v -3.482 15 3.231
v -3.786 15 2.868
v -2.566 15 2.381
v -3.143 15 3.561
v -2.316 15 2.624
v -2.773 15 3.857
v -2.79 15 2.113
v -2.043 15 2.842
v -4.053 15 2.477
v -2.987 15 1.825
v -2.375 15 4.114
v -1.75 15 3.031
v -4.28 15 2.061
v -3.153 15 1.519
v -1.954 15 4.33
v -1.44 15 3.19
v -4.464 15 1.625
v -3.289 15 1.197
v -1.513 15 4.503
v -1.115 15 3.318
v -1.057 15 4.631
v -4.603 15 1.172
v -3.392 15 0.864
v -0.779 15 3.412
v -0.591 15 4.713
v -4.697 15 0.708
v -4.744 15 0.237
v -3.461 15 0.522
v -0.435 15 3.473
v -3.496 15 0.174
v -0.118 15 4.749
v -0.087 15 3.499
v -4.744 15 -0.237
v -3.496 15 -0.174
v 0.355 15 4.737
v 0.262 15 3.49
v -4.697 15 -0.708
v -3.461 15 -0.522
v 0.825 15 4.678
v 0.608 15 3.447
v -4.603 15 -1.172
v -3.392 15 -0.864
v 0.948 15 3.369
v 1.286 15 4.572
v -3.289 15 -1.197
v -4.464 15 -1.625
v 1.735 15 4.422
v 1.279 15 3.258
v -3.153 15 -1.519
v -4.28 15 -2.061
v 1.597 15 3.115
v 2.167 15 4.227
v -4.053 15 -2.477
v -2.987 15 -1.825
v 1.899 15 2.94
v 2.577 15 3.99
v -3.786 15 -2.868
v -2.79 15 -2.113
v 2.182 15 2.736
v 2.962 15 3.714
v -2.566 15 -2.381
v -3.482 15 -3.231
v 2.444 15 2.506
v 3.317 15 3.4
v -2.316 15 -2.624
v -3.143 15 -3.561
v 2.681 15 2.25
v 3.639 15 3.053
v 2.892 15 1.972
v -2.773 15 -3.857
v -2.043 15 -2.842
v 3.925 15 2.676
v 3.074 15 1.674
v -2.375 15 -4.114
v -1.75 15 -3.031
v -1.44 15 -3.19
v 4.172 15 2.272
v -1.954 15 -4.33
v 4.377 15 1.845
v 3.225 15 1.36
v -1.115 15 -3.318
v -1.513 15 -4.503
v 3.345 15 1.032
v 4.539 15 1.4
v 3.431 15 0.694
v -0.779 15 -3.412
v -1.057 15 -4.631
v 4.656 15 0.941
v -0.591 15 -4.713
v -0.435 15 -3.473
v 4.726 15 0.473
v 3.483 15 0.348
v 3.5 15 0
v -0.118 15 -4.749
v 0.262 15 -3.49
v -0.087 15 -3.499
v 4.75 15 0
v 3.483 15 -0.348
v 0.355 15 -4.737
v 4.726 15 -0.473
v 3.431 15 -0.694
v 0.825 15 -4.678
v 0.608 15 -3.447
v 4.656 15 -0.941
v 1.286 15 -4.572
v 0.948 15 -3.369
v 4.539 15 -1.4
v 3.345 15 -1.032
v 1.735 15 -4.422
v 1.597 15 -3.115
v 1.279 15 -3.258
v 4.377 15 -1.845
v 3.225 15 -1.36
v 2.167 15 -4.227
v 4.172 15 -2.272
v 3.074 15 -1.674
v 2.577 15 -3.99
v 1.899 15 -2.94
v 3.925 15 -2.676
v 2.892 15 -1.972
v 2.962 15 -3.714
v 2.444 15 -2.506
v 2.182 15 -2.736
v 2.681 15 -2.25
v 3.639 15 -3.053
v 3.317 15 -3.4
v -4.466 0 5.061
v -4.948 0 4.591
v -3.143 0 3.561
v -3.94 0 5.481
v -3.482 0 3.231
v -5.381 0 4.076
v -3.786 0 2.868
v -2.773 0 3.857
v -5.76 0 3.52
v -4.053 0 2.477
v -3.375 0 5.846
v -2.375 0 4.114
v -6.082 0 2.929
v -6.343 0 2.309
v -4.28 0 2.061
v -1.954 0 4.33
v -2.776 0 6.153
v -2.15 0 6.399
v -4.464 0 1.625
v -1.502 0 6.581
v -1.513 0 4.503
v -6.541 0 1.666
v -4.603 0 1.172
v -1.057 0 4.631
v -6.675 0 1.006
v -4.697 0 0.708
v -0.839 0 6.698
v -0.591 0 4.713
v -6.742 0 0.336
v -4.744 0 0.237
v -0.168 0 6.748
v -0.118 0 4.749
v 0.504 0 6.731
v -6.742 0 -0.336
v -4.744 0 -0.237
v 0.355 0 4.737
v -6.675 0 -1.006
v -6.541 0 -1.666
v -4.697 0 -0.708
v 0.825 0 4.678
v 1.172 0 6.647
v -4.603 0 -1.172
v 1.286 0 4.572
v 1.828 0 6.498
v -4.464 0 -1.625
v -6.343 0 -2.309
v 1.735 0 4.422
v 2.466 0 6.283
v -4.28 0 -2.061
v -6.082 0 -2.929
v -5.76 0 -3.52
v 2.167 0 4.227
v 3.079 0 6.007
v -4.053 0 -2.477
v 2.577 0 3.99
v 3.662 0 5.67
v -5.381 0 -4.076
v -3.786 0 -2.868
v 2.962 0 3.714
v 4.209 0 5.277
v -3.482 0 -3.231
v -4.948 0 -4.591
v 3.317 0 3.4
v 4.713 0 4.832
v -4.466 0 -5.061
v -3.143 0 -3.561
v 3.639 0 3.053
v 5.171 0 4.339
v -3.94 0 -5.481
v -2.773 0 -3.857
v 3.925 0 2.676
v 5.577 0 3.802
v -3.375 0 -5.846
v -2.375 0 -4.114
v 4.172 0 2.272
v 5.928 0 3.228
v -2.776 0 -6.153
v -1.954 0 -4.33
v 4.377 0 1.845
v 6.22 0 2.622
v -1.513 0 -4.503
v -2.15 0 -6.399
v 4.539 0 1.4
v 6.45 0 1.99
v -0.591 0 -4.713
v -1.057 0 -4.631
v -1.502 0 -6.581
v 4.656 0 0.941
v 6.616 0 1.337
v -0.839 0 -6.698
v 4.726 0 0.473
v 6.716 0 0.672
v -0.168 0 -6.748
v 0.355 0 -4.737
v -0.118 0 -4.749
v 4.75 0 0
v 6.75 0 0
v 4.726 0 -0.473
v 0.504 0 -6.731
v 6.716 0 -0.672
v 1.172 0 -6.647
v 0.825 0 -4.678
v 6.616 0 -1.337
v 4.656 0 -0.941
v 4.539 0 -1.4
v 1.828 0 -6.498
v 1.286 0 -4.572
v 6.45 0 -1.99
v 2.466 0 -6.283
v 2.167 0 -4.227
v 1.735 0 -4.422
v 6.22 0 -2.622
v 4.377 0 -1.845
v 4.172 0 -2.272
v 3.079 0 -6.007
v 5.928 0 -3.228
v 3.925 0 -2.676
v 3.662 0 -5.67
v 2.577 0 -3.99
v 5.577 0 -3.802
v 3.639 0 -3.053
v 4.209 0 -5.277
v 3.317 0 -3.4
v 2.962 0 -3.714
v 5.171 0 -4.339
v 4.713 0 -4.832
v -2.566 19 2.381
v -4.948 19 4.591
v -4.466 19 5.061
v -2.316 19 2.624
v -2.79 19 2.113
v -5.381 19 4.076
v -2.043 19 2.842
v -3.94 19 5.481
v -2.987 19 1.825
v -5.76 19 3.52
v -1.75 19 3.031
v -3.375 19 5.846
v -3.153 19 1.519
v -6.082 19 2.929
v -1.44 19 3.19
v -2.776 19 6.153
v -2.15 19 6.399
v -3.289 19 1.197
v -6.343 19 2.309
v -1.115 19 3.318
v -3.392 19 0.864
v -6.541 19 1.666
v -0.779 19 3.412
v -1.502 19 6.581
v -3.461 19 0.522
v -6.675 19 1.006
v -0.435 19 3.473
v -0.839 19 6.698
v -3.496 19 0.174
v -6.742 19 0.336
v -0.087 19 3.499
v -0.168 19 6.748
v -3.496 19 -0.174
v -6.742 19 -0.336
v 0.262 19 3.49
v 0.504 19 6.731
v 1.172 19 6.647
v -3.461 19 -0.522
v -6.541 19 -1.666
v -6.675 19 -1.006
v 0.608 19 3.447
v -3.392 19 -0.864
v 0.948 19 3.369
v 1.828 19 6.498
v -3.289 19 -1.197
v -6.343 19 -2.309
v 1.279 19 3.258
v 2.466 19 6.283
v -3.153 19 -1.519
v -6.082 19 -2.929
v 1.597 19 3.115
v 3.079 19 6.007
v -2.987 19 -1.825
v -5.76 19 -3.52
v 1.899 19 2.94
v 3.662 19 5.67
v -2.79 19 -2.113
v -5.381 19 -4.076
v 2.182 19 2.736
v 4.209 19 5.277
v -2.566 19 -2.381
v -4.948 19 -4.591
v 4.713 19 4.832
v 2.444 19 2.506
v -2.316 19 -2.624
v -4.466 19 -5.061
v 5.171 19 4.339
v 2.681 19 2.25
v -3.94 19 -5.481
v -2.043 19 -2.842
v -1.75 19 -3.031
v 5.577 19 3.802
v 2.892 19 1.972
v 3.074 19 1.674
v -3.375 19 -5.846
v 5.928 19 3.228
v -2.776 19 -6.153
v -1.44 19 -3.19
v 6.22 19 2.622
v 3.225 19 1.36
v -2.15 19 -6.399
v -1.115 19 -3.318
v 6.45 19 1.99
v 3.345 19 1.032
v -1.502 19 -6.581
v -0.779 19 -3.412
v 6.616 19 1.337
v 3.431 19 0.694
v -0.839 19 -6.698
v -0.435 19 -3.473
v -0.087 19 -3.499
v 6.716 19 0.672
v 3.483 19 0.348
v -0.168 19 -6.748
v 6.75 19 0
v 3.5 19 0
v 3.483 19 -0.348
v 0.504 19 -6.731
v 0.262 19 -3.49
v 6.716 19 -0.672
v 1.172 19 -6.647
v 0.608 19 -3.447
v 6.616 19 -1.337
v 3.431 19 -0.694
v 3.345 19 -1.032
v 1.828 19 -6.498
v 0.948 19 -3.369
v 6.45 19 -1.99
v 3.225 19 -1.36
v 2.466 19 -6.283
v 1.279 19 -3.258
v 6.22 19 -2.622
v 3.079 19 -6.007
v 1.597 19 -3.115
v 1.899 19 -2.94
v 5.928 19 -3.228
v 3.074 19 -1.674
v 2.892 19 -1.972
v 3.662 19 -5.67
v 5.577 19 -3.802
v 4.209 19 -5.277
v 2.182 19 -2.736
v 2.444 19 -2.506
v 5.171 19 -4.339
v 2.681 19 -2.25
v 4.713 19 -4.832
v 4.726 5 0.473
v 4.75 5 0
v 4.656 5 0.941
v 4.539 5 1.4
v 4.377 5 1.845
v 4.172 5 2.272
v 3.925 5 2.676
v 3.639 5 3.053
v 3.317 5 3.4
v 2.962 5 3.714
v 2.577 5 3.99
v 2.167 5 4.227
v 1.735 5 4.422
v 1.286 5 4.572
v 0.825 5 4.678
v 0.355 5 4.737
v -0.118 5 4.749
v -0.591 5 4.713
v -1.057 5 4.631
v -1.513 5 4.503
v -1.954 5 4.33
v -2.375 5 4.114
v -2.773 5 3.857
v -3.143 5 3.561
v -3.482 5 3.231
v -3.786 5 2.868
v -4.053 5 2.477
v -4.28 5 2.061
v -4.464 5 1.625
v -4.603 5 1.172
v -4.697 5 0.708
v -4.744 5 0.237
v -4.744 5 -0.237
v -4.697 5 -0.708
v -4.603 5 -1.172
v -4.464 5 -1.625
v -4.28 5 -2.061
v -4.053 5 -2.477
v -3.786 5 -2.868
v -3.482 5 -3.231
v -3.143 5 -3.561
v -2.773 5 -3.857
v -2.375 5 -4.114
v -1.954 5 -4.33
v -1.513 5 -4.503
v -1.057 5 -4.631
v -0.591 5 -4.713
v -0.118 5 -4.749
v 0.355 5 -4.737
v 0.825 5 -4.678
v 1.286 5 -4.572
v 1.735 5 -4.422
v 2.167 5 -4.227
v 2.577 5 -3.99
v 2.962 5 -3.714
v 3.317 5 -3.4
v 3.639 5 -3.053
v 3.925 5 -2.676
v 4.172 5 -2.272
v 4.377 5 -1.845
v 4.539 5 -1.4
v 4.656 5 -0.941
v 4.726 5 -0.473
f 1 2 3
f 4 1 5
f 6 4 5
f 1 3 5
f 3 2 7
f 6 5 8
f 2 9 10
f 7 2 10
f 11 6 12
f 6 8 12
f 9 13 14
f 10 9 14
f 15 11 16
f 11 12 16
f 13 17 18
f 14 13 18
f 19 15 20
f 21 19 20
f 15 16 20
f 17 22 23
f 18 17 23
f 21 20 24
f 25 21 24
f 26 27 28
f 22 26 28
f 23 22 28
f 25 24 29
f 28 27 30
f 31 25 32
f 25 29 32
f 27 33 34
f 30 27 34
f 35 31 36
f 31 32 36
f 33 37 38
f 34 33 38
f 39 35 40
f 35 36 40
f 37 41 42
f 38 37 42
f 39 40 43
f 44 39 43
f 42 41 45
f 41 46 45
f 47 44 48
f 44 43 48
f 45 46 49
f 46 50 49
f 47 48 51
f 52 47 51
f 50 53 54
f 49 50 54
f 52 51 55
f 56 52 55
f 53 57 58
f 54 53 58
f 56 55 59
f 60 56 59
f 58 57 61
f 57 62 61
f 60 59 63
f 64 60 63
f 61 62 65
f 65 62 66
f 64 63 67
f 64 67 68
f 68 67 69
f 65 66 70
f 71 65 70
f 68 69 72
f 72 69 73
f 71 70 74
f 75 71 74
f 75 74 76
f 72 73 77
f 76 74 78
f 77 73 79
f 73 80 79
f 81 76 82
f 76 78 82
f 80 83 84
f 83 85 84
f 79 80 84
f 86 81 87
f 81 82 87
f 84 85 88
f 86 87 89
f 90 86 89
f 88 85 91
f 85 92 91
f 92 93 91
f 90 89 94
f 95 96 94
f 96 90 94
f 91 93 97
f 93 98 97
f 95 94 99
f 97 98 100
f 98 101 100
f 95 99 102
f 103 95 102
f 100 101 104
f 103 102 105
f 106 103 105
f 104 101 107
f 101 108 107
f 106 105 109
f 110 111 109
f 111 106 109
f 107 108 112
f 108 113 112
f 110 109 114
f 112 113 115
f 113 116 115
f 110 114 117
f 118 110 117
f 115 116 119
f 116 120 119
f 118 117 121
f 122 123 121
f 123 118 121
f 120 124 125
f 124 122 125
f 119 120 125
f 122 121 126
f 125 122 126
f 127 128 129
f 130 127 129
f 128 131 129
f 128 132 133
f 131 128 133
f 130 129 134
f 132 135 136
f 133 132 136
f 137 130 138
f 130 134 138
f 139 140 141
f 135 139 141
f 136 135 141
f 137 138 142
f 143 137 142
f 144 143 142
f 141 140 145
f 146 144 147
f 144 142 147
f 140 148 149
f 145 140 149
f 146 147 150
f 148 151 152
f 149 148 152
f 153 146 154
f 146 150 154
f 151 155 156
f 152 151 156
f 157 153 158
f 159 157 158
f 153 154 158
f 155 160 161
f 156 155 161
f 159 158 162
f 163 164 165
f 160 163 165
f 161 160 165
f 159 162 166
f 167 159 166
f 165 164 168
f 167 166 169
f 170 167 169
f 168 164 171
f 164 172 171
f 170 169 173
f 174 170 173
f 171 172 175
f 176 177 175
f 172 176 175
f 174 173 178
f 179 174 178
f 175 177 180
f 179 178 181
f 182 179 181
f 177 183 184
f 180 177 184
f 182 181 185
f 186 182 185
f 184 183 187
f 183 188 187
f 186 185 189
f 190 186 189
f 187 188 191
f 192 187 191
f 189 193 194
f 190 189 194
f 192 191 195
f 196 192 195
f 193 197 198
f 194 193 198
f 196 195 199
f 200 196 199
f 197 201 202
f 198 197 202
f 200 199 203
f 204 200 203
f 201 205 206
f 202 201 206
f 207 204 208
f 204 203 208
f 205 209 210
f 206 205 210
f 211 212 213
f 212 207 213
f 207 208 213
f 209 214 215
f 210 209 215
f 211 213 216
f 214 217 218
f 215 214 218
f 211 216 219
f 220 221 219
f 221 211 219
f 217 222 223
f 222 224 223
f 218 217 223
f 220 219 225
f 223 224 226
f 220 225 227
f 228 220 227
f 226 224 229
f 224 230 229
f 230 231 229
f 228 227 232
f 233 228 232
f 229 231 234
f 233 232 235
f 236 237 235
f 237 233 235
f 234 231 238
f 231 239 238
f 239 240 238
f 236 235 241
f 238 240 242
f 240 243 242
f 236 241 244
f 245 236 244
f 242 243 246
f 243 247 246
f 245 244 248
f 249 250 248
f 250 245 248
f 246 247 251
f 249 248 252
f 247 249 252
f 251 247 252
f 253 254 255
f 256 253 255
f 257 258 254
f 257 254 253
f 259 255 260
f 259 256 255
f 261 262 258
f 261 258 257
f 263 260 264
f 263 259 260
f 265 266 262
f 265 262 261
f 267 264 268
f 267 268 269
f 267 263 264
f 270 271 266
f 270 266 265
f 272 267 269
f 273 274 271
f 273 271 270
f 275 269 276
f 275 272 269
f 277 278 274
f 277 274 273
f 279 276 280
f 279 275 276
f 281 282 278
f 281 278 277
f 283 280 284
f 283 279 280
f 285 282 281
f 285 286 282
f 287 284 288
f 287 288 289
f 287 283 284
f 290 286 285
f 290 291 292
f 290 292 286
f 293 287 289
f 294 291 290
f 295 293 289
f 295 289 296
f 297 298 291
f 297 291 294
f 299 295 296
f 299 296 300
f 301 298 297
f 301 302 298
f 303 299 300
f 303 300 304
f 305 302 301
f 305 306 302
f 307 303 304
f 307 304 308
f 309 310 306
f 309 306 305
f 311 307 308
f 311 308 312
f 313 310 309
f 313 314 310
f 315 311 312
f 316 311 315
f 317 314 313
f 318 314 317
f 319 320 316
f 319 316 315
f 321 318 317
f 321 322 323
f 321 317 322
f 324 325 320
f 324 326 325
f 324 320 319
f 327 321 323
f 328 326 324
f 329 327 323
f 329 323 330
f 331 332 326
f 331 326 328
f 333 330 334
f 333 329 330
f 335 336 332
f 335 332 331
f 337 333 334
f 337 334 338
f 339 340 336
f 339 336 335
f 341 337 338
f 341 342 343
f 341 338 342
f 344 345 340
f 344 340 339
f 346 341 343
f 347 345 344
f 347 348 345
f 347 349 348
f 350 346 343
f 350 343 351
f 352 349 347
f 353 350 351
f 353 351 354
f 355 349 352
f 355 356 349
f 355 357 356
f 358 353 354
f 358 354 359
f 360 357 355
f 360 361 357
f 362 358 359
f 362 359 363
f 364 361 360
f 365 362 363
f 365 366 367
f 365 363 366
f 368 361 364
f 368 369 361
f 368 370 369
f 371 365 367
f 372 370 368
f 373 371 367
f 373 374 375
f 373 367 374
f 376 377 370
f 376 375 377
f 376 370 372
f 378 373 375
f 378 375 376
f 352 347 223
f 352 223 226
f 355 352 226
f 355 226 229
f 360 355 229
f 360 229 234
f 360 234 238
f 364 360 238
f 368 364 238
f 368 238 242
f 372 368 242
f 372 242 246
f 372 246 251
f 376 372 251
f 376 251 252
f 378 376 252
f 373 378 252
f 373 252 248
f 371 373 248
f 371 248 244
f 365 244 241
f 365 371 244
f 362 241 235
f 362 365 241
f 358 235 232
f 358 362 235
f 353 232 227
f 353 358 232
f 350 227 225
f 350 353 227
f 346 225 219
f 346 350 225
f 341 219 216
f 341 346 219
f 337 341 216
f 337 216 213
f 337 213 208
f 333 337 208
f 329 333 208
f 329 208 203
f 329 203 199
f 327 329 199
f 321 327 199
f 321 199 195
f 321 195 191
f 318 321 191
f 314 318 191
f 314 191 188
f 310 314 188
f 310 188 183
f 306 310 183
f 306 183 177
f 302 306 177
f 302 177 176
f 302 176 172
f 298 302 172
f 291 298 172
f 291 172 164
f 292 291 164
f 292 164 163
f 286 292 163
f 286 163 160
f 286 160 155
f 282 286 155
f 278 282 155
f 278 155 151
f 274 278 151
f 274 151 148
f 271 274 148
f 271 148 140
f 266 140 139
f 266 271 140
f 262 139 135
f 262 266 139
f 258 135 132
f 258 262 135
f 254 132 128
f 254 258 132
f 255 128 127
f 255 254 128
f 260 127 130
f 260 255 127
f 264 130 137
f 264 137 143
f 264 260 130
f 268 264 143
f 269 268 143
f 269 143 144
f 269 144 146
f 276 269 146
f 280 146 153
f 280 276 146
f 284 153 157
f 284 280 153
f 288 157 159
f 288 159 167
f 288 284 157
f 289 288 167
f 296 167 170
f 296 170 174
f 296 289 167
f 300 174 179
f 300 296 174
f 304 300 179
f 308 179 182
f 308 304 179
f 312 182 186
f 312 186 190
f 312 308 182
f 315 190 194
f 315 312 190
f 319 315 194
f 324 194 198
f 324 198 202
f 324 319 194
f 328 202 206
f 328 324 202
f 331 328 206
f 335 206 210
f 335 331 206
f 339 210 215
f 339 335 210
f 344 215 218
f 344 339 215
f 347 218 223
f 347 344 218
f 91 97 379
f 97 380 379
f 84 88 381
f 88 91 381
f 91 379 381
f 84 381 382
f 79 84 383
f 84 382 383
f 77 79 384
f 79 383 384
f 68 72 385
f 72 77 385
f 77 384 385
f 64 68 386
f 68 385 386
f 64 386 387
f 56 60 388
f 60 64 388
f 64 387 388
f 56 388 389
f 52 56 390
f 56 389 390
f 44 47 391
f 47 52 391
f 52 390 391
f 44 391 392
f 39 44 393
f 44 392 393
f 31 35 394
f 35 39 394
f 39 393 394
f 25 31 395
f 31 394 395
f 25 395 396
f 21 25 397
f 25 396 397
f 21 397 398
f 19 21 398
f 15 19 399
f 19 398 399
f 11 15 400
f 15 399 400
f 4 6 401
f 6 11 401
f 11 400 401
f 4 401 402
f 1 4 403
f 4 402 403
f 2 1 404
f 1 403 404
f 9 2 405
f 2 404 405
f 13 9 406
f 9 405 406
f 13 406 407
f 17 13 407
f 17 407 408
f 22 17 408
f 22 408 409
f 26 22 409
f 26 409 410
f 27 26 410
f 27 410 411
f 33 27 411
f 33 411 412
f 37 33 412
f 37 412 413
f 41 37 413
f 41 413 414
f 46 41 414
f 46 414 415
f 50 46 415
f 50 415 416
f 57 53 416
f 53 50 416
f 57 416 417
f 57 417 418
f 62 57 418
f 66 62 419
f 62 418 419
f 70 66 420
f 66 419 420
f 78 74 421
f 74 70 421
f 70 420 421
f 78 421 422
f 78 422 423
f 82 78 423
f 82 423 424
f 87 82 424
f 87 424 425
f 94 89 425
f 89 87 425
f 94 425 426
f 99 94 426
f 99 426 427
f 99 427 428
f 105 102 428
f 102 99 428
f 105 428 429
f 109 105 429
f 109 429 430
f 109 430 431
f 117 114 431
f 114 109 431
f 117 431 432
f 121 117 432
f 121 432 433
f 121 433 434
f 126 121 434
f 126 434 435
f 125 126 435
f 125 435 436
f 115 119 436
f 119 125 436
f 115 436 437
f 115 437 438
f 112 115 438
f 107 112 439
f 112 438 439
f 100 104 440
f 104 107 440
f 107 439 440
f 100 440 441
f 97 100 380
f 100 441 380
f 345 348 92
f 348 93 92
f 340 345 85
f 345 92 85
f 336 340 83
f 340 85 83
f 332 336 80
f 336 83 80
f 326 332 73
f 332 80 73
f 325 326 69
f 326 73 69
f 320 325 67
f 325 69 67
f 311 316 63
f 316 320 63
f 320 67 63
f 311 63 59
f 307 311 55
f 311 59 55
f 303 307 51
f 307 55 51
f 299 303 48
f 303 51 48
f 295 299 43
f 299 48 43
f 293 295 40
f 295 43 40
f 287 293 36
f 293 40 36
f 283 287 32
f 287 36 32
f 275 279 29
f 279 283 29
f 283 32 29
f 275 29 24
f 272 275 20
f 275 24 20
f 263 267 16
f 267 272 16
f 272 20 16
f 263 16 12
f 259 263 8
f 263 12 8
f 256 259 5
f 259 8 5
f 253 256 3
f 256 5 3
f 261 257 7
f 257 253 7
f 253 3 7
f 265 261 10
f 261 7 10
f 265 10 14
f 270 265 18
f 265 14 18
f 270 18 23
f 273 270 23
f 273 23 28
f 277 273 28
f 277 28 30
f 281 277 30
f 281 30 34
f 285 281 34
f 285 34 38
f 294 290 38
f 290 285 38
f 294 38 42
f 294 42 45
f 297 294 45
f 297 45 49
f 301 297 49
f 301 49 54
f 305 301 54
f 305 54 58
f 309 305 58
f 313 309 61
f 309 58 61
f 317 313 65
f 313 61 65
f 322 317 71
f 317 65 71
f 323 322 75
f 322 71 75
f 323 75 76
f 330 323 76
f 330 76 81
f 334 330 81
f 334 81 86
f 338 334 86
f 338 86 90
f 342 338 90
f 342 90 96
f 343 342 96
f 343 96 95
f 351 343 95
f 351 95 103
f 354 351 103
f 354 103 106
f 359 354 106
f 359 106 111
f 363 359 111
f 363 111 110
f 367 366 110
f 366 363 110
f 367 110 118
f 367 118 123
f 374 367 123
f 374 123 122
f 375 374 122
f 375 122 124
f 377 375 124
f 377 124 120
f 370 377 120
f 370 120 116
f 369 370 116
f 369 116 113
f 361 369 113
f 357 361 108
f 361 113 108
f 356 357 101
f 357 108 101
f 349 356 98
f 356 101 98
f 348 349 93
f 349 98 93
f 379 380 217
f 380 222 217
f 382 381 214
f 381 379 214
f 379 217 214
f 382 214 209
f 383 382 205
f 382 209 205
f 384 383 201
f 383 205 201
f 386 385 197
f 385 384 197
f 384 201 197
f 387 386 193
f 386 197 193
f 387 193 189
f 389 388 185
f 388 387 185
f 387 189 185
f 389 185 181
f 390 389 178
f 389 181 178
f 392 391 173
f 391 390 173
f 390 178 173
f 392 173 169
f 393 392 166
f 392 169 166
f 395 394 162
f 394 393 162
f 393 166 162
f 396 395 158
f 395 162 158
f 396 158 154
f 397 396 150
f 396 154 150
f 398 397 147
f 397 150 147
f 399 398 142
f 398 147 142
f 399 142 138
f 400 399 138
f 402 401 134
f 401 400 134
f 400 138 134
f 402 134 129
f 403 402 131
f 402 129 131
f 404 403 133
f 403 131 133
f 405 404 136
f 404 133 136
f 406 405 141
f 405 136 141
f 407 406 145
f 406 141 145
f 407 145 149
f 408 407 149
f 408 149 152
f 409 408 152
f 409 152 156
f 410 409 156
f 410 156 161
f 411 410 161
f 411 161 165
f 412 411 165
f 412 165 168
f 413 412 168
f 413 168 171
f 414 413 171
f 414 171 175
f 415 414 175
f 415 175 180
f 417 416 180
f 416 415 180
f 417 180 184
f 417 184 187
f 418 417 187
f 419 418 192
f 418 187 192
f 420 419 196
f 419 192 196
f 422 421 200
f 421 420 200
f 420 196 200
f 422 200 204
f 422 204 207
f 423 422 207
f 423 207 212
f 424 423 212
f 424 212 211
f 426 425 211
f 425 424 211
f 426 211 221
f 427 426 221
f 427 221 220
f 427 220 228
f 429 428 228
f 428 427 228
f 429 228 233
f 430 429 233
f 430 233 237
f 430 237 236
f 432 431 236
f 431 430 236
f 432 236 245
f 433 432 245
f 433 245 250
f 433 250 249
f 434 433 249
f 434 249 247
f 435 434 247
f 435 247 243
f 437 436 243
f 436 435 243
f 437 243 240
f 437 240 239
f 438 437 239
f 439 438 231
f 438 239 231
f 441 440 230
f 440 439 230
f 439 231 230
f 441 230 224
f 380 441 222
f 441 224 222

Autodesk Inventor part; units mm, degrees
ref_plane "YZ Plane" through (0, 0, 0) normal (1, 0, 0) x (0, 1, 0)
ref_plane "XZ Plane" through (0, 0, 0) normal (0, 1, 0) x (-1, 0, 0)
ref_plane "XY Plane" through (0, 0, 0) normal (0, 0, 1) x (1, 0, 0)
sketch "Sketch1" plane through (0, 0, 0) normal (0, 0, 1) x (1, 0, 0)
  line L0 (0, 0) -> (4.75, 0) construction
  line L1 (6.75, 0) -> (6.75, 19)
  line L2 (6.75, 19) -> (3.5, 19)
  line L3 (3.5, 19) -> (3.5, 15)
  line L4 (3.5, 15) -> (3.5, 15)
  line L5 (3.5, 15) -> (3.5, 5) construction
  line L6 (3.5, 5) -> (0, 5) construction
  line L7 (0, 5) -> (0, 0) construction
  line L8 (4.75, 5) -> (3.5, 5)
  line L9 (3.5, 5) -> (3.5, 10.822) construction
  line L10 (3.5, 15) -> (4.75, 15)
  line L11 (4.75, 15) -> (4.75, 5)
  line L12 (4.75, 5) -> (3.5, 5)
  line L13 (4.75, 5) -> (4.75, 0)
  line L14 (4.75, 0) -> (6.75, 0)
  line L15 (0, -3.8) -> (0, 22.8) projected
  point P0 (3.375, 0)
  dimension "d0" = 4
  dimension "d7" = 3.5
  dimension "d9" = 10
  dimension "d11" = 4.75
  dimension "d12" = 2
  dimension "d13" = 5
revolve "Revolution1" add sketch "Sketch1" angle 360 about axis through (0, -10, 0) along (0, 1, 0)
properties part number "ButtonHolder_V3_3DPrint"
